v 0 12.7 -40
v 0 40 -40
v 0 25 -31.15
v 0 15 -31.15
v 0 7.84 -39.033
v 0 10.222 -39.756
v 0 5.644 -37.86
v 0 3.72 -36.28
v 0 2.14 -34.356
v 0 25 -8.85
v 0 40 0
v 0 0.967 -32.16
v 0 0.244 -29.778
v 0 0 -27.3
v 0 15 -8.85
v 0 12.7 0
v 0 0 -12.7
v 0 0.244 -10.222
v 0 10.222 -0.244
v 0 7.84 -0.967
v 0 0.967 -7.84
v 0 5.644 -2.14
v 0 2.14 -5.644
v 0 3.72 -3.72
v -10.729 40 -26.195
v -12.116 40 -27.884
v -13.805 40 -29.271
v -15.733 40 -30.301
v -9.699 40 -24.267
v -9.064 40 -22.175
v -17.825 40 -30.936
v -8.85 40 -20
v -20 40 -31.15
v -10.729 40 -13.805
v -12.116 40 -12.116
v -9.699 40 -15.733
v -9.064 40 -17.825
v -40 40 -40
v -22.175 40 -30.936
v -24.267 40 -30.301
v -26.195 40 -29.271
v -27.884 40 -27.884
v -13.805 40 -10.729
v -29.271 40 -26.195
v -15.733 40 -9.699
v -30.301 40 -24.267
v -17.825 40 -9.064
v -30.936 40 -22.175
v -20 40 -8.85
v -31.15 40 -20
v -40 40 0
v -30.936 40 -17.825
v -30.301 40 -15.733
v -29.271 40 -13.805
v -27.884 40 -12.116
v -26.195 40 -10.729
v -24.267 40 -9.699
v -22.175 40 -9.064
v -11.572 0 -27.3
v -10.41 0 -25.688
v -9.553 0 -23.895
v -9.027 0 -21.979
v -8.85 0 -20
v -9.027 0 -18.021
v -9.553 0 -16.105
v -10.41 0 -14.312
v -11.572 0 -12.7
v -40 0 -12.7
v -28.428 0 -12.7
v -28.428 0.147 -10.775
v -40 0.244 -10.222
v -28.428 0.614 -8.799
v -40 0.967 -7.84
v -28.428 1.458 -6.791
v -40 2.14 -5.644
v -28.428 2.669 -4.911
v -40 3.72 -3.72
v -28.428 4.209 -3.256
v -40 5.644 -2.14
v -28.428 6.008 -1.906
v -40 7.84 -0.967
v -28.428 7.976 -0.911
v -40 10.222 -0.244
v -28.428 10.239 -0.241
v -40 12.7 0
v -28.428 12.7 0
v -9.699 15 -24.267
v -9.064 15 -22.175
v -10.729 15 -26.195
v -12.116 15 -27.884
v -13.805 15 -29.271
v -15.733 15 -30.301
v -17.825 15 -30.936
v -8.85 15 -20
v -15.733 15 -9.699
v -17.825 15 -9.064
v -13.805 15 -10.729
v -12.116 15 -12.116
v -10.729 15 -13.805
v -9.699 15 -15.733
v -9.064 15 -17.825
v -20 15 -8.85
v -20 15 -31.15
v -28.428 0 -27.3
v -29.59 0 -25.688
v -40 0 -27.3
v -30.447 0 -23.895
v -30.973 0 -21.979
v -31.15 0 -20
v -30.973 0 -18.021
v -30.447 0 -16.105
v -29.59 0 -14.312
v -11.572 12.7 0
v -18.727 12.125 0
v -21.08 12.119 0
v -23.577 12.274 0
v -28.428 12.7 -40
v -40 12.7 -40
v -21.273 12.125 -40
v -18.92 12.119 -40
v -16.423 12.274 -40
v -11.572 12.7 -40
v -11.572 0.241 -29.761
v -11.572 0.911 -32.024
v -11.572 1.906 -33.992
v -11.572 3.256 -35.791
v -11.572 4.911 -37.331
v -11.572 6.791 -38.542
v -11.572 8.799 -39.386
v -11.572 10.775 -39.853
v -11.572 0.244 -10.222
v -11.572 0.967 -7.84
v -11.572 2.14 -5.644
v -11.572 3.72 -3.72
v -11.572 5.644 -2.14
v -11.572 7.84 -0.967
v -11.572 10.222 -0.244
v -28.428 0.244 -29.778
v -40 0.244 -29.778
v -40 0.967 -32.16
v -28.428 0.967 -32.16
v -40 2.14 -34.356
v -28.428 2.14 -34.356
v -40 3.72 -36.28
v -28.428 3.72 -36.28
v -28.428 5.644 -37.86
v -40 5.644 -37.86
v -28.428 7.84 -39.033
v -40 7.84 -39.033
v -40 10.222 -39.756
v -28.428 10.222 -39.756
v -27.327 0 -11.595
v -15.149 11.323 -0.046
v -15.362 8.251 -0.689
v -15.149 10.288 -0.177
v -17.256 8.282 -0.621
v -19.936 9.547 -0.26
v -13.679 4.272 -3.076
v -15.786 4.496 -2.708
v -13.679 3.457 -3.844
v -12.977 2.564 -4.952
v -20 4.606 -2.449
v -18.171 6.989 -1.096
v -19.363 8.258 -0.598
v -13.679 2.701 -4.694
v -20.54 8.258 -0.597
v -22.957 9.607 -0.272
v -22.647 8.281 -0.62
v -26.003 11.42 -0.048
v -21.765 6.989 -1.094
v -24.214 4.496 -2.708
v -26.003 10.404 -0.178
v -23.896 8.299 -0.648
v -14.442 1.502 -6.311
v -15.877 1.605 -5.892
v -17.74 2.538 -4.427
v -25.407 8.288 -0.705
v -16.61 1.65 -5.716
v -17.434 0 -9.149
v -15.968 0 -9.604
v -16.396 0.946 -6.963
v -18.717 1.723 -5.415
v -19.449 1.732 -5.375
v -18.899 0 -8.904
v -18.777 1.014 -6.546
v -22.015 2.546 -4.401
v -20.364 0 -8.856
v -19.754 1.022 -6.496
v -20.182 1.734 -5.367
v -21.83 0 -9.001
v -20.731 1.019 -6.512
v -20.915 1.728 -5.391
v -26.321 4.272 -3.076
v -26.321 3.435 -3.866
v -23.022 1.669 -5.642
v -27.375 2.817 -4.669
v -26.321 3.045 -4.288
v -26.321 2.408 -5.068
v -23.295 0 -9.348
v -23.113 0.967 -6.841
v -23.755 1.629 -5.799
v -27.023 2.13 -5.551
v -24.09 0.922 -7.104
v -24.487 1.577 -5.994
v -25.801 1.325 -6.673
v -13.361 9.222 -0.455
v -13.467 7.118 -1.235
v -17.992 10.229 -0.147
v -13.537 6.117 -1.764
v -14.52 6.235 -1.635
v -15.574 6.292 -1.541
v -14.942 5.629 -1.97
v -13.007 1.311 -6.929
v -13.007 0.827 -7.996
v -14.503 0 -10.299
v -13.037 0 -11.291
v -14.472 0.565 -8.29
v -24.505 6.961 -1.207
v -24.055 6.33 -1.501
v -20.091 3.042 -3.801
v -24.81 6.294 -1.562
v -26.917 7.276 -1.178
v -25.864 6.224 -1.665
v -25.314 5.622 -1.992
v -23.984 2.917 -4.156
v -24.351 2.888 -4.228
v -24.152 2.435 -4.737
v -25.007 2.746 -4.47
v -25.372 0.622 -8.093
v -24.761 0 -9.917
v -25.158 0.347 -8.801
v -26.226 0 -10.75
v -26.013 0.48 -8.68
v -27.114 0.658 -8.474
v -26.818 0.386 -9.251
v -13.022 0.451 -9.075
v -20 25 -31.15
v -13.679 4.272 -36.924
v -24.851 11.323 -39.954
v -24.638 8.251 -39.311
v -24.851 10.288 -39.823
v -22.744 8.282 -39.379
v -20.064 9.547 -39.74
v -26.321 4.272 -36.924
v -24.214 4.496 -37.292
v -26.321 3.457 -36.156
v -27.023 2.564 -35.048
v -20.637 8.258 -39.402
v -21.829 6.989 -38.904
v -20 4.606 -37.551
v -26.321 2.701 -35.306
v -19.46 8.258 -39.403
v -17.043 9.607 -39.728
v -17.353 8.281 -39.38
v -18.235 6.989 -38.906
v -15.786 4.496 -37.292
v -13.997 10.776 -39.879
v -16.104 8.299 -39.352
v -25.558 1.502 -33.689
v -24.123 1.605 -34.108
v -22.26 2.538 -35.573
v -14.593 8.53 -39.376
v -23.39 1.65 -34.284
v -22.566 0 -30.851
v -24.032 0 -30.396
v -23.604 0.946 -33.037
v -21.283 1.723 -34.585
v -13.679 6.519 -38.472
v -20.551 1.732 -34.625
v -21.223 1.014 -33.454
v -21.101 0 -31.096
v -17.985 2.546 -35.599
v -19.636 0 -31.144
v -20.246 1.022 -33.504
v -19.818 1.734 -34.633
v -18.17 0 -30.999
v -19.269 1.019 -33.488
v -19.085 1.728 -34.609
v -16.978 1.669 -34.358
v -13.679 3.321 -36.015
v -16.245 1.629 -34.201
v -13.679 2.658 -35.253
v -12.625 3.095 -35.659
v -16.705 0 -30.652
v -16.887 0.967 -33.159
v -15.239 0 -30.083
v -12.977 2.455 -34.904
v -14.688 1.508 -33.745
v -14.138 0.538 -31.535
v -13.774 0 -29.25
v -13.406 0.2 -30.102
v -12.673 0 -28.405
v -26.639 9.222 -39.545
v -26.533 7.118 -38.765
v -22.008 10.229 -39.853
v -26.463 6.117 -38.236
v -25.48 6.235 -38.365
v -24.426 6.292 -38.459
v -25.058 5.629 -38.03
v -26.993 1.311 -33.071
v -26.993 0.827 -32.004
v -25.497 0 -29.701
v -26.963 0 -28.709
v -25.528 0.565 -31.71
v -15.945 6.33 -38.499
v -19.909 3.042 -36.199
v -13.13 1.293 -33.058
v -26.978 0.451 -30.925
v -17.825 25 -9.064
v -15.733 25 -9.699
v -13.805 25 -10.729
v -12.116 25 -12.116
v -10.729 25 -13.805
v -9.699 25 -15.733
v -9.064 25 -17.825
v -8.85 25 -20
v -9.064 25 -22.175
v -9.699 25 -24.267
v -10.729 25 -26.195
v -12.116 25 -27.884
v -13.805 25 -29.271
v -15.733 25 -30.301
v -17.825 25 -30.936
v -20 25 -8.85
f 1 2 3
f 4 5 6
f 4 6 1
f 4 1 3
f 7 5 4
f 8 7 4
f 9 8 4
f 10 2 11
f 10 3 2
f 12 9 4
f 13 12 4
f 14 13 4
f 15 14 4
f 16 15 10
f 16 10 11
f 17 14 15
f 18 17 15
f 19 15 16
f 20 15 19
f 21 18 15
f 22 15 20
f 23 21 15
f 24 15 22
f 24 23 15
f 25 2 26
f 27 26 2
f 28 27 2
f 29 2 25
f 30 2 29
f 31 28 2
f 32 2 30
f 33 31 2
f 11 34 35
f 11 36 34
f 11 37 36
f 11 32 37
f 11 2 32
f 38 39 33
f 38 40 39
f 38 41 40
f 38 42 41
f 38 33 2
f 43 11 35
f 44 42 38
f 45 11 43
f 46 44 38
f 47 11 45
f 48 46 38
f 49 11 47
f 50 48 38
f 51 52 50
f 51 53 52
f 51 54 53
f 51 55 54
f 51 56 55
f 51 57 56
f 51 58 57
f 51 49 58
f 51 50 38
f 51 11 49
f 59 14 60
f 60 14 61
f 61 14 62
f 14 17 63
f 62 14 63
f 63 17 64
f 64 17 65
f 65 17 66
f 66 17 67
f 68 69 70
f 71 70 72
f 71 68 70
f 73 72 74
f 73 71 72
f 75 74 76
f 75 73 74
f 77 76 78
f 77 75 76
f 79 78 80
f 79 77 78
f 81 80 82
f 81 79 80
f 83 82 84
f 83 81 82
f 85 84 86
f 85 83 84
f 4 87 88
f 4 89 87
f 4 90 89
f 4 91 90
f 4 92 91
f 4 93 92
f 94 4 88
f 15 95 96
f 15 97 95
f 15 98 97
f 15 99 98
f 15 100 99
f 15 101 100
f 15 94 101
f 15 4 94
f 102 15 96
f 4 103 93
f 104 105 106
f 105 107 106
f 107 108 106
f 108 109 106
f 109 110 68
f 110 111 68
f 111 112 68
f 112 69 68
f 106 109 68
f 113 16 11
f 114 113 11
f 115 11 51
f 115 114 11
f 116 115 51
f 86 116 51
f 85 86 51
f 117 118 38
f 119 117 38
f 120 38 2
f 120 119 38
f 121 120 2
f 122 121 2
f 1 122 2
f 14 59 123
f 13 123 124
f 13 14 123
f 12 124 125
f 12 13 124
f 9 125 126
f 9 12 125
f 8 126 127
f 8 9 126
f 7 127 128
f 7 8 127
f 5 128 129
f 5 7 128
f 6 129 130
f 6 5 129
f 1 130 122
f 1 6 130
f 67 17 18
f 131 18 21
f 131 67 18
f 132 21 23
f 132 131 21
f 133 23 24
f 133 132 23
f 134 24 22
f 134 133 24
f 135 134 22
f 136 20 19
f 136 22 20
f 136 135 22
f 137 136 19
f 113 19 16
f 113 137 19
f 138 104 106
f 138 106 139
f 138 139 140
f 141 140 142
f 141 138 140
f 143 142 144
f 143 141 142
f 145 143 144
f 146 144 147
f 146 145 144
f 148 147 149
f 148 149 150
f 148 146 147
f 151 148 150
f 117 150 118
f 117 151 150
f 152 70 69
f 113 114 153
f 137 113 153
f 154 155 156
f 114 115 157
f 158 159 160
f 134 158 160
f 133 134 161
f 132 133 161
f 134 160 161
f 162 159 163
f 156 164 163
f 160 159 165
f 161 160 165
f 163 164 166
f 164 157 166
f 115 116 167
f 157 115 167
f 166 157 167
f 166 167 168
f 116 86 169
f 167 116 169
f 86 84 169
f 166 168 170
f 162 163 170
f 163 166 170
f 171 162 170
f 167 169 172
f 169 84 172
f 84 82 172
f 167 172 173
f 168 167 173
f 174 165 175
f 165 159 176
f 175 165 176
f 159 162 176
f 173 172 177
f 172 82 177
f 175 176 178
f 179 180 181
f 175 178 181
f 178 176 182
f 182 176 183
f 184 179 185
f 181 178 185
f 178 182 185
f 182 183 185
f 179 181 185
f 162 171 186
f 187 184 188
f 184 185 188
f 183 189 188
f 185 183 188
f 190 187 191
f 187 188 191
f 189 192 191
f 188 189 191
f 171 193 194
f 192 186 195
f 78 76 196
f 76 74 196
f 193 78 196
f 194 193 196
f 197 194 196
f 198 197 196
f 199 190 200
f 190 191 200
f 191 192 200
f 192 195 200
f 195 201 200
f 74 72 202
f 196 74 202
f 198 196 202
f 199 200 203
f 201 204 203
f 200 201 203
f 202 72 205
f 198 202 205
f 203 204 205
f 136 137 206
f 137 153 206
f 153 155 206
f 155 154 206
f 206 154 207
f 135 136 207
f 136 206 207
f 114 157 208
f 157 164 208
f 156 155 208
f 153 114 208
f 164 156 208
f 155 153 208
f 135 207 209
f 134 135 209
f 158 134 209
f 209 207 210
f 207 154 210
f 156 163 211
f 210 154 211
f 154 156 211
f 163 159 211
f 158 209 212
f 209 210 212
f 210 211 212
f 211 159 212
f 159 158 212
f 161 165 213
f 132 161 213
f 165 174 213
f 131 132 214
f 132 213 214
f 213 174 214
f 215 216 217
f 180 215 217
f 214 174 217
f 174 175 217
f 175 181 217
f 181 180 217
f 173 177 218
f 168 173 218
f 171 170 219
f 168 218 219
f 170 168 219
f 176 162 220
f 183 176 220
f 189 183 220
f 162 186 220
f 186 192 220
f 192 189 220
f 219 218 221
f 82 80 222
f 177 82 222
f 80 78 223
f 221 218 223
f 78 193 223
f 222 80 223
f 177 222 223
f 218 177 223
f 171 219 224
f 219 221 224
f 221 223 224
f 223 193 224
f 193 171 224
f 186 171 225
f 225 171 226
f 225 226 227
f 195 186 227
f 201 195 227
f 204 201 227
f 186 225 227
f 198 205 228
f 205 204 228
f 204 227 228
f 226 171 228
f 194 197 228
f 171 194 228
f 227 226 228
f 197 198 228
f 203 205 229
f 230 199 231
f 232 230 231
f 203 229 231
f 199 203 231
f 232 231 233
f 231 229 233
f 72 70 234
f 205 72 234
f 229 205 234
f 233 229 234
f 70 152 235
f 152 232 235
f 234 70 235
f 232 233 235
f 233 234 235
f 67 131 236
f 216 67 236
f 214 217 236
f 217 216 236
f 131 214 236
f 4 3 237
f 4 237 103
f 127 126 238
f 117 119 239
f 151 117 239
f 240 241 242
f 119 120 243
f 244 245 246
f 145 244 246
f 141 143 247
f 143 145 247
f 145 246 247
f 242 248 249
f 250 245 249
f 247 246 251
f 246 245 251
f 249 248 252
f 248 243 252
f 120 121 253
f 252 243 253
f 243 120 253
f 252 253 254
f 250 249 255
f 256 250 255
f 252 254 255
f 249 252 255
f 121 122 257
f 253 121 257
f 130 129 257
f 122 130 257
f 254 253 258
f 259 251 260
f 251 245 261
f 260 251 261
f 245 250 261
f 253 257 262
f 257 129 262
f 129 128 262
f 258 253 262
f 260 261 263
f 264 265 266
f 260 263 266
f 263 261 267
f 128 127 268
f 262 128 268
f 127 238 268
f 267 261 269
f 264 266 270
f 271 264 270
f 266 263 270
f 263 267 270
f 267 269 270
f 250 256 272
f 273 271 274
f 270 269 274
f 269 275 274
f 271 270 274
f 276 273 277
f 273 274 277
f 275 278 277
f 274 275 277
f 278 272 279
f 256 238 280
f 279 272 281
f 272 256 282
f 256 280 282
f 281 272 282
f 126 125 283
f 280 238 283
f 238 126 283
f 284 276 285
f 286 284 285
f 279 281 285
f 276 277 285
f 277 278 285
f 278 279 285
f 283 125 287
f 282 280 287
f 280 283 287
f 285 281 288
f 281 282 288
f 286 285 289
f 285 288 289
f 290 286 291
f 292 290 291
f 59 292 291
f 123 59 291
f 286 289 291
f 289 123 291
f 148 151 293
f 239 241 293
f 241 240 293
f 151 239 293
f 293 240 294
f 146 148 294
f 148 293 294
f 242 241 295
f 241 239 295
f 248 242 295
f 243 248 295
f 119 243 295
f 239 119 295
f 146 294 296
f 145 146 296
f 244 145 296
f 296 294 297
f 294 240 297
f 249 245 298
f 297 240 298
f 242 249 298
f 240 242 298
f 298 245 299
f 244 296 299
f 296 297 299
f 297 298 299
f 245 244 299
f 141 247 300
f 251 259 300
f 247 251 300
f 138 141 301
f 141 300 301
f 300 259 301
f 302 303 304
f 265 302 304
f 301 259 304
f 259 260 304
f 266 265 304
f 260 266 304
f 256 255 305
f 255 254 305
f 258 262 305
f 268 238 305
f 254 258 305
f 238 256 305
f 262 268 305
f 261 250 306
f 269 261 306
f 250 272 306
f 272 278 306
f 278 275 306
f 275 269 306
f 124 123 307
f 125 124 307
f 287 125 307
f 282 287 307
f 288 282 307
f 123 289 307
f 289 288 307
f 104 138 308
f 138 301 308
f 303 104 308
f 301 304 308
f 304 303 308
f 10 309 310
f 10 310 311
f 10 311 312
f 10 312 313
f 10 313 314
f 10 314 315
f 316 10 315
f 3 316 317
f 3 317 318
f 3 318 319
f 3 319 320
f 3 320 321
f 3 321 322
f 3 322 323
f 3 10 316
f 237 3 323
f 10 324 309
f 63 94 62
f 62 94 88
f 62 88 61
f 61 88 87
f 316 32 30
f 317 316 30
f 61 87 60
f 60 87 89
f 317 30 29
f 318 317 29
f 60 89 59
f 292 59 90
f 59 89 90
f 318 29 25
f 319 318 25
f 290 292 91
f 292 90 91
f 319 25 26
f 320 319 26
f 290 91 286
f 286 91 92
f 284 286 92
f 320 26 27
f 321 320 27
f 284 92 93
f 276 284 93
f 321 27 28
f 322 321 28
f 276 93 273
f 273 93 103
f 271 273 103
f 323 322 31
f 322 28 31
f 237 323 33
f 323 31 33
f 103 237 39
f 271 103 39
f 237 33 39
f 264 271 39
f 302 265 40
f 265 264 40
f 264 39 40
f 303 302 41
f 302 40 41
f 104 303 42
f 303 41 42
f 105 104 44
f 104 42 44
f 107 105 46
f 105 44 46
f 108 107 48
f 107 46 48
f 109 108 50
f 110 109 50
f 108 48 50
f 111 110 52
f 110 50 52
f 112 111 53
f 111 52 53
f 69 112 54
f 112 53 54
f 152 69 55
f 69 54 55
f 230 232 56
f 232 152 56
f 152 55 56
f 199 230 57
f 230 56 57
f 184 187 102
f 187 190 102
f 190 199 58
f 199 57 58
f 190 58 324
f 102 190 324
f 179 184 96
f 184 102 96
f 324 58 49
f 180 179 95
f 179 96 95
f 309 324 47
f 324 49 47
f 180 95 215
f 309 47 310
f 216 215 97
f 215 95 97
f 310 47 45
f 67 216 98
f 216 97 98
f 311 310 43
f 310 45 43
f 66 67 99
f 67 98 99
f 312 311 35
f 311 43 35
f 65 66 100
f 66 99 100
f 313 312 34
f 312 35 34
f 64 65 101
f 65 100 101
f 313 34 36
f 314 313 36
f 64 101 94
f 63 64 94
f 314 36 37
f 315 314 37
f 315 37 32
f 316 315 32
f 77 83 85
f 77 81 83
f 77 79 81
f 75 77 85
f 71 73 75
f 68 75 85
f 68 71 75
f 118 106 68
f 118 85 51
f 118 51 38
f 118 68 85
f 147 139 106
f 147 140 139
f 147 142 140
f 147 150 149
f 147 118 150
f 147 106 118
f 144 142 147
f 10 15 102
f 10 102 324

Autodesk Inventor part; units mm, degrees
ref_plane "YZ Plane" through (0, 0, 0) normal (1, 0, 0) x (0, 1, 0)
ref_plane "XZ Plane" through (0, 0, 0) normal (0, 1, 0) x (-1, 0, 0)
ref_plane "XY Plane" through (0, 0, 0) normal (0, 0, 1) x (1, 0, 0)
sketch "Sketch1" plane through (0, 0, 0) normal (0, 1, 0) x (-1, 0, 0)
  line L0 (0, 0) -> (40, 0)
  line L1 (40, 0) -> (40, -40)
  line L2 (40, -40) -> (0, -40)
  line L3 (0, -40) -> (0, 0)
  dimension "d0" = 40
  dimension "d1" = 40
extrude "Extrusion1" add sketch "Sketch1" along normal blind 40
sketch "Sketch2" plane through (0, 40, 0) normal (0, 1, 0) x (1, 0, 0)
  circle A0 centre (-20, 20) radius 11.15
  line L0 (-40, 40) -> (-40, 0) projected
  line L1 (-40, 0) -> (0, 0) projected
  dimension "d4" = 22.3
  dimension "d5" = 20
  dimension "d6" = 20
extrude "Extrusion2" cut sketch "Sketch2" against normal blind 40
sketch "Sketch3" plane through (0, 0, 0) normal (1, 0, 0) x (0, 0, -1)
  line L0 (8.85, 25) -> (31.15, 25)
  line L1 (31.15, 25) -> (31.15, 15)
  line L2 (31.15, 15) -> (8.85, 15)
  line L3 (8.85, 15) -> (8.85, 25)
  line L4 (8.85, 25) -> (31.15, 15) construction
  line L5 (31.15, 25) -> (8.85, 15) construction
  line L6 (0, 0) -> (0, 40) projected
  line L7 (0, 40) -> (40, 40) projected
  point P0 (20, 20)
  dimension "d9" = 20
  dimension "d10" = 15
  dimension "d11" = 25
  dimension "d12" = 22.3
extrude "Extrusion3" cut sketch "Sketch3" against normal blind 20
fillet "Fillet1" radius 12.7 2 edges at (-20, 0, 0) (-20, 0, -40)
properties part number "YMount"
